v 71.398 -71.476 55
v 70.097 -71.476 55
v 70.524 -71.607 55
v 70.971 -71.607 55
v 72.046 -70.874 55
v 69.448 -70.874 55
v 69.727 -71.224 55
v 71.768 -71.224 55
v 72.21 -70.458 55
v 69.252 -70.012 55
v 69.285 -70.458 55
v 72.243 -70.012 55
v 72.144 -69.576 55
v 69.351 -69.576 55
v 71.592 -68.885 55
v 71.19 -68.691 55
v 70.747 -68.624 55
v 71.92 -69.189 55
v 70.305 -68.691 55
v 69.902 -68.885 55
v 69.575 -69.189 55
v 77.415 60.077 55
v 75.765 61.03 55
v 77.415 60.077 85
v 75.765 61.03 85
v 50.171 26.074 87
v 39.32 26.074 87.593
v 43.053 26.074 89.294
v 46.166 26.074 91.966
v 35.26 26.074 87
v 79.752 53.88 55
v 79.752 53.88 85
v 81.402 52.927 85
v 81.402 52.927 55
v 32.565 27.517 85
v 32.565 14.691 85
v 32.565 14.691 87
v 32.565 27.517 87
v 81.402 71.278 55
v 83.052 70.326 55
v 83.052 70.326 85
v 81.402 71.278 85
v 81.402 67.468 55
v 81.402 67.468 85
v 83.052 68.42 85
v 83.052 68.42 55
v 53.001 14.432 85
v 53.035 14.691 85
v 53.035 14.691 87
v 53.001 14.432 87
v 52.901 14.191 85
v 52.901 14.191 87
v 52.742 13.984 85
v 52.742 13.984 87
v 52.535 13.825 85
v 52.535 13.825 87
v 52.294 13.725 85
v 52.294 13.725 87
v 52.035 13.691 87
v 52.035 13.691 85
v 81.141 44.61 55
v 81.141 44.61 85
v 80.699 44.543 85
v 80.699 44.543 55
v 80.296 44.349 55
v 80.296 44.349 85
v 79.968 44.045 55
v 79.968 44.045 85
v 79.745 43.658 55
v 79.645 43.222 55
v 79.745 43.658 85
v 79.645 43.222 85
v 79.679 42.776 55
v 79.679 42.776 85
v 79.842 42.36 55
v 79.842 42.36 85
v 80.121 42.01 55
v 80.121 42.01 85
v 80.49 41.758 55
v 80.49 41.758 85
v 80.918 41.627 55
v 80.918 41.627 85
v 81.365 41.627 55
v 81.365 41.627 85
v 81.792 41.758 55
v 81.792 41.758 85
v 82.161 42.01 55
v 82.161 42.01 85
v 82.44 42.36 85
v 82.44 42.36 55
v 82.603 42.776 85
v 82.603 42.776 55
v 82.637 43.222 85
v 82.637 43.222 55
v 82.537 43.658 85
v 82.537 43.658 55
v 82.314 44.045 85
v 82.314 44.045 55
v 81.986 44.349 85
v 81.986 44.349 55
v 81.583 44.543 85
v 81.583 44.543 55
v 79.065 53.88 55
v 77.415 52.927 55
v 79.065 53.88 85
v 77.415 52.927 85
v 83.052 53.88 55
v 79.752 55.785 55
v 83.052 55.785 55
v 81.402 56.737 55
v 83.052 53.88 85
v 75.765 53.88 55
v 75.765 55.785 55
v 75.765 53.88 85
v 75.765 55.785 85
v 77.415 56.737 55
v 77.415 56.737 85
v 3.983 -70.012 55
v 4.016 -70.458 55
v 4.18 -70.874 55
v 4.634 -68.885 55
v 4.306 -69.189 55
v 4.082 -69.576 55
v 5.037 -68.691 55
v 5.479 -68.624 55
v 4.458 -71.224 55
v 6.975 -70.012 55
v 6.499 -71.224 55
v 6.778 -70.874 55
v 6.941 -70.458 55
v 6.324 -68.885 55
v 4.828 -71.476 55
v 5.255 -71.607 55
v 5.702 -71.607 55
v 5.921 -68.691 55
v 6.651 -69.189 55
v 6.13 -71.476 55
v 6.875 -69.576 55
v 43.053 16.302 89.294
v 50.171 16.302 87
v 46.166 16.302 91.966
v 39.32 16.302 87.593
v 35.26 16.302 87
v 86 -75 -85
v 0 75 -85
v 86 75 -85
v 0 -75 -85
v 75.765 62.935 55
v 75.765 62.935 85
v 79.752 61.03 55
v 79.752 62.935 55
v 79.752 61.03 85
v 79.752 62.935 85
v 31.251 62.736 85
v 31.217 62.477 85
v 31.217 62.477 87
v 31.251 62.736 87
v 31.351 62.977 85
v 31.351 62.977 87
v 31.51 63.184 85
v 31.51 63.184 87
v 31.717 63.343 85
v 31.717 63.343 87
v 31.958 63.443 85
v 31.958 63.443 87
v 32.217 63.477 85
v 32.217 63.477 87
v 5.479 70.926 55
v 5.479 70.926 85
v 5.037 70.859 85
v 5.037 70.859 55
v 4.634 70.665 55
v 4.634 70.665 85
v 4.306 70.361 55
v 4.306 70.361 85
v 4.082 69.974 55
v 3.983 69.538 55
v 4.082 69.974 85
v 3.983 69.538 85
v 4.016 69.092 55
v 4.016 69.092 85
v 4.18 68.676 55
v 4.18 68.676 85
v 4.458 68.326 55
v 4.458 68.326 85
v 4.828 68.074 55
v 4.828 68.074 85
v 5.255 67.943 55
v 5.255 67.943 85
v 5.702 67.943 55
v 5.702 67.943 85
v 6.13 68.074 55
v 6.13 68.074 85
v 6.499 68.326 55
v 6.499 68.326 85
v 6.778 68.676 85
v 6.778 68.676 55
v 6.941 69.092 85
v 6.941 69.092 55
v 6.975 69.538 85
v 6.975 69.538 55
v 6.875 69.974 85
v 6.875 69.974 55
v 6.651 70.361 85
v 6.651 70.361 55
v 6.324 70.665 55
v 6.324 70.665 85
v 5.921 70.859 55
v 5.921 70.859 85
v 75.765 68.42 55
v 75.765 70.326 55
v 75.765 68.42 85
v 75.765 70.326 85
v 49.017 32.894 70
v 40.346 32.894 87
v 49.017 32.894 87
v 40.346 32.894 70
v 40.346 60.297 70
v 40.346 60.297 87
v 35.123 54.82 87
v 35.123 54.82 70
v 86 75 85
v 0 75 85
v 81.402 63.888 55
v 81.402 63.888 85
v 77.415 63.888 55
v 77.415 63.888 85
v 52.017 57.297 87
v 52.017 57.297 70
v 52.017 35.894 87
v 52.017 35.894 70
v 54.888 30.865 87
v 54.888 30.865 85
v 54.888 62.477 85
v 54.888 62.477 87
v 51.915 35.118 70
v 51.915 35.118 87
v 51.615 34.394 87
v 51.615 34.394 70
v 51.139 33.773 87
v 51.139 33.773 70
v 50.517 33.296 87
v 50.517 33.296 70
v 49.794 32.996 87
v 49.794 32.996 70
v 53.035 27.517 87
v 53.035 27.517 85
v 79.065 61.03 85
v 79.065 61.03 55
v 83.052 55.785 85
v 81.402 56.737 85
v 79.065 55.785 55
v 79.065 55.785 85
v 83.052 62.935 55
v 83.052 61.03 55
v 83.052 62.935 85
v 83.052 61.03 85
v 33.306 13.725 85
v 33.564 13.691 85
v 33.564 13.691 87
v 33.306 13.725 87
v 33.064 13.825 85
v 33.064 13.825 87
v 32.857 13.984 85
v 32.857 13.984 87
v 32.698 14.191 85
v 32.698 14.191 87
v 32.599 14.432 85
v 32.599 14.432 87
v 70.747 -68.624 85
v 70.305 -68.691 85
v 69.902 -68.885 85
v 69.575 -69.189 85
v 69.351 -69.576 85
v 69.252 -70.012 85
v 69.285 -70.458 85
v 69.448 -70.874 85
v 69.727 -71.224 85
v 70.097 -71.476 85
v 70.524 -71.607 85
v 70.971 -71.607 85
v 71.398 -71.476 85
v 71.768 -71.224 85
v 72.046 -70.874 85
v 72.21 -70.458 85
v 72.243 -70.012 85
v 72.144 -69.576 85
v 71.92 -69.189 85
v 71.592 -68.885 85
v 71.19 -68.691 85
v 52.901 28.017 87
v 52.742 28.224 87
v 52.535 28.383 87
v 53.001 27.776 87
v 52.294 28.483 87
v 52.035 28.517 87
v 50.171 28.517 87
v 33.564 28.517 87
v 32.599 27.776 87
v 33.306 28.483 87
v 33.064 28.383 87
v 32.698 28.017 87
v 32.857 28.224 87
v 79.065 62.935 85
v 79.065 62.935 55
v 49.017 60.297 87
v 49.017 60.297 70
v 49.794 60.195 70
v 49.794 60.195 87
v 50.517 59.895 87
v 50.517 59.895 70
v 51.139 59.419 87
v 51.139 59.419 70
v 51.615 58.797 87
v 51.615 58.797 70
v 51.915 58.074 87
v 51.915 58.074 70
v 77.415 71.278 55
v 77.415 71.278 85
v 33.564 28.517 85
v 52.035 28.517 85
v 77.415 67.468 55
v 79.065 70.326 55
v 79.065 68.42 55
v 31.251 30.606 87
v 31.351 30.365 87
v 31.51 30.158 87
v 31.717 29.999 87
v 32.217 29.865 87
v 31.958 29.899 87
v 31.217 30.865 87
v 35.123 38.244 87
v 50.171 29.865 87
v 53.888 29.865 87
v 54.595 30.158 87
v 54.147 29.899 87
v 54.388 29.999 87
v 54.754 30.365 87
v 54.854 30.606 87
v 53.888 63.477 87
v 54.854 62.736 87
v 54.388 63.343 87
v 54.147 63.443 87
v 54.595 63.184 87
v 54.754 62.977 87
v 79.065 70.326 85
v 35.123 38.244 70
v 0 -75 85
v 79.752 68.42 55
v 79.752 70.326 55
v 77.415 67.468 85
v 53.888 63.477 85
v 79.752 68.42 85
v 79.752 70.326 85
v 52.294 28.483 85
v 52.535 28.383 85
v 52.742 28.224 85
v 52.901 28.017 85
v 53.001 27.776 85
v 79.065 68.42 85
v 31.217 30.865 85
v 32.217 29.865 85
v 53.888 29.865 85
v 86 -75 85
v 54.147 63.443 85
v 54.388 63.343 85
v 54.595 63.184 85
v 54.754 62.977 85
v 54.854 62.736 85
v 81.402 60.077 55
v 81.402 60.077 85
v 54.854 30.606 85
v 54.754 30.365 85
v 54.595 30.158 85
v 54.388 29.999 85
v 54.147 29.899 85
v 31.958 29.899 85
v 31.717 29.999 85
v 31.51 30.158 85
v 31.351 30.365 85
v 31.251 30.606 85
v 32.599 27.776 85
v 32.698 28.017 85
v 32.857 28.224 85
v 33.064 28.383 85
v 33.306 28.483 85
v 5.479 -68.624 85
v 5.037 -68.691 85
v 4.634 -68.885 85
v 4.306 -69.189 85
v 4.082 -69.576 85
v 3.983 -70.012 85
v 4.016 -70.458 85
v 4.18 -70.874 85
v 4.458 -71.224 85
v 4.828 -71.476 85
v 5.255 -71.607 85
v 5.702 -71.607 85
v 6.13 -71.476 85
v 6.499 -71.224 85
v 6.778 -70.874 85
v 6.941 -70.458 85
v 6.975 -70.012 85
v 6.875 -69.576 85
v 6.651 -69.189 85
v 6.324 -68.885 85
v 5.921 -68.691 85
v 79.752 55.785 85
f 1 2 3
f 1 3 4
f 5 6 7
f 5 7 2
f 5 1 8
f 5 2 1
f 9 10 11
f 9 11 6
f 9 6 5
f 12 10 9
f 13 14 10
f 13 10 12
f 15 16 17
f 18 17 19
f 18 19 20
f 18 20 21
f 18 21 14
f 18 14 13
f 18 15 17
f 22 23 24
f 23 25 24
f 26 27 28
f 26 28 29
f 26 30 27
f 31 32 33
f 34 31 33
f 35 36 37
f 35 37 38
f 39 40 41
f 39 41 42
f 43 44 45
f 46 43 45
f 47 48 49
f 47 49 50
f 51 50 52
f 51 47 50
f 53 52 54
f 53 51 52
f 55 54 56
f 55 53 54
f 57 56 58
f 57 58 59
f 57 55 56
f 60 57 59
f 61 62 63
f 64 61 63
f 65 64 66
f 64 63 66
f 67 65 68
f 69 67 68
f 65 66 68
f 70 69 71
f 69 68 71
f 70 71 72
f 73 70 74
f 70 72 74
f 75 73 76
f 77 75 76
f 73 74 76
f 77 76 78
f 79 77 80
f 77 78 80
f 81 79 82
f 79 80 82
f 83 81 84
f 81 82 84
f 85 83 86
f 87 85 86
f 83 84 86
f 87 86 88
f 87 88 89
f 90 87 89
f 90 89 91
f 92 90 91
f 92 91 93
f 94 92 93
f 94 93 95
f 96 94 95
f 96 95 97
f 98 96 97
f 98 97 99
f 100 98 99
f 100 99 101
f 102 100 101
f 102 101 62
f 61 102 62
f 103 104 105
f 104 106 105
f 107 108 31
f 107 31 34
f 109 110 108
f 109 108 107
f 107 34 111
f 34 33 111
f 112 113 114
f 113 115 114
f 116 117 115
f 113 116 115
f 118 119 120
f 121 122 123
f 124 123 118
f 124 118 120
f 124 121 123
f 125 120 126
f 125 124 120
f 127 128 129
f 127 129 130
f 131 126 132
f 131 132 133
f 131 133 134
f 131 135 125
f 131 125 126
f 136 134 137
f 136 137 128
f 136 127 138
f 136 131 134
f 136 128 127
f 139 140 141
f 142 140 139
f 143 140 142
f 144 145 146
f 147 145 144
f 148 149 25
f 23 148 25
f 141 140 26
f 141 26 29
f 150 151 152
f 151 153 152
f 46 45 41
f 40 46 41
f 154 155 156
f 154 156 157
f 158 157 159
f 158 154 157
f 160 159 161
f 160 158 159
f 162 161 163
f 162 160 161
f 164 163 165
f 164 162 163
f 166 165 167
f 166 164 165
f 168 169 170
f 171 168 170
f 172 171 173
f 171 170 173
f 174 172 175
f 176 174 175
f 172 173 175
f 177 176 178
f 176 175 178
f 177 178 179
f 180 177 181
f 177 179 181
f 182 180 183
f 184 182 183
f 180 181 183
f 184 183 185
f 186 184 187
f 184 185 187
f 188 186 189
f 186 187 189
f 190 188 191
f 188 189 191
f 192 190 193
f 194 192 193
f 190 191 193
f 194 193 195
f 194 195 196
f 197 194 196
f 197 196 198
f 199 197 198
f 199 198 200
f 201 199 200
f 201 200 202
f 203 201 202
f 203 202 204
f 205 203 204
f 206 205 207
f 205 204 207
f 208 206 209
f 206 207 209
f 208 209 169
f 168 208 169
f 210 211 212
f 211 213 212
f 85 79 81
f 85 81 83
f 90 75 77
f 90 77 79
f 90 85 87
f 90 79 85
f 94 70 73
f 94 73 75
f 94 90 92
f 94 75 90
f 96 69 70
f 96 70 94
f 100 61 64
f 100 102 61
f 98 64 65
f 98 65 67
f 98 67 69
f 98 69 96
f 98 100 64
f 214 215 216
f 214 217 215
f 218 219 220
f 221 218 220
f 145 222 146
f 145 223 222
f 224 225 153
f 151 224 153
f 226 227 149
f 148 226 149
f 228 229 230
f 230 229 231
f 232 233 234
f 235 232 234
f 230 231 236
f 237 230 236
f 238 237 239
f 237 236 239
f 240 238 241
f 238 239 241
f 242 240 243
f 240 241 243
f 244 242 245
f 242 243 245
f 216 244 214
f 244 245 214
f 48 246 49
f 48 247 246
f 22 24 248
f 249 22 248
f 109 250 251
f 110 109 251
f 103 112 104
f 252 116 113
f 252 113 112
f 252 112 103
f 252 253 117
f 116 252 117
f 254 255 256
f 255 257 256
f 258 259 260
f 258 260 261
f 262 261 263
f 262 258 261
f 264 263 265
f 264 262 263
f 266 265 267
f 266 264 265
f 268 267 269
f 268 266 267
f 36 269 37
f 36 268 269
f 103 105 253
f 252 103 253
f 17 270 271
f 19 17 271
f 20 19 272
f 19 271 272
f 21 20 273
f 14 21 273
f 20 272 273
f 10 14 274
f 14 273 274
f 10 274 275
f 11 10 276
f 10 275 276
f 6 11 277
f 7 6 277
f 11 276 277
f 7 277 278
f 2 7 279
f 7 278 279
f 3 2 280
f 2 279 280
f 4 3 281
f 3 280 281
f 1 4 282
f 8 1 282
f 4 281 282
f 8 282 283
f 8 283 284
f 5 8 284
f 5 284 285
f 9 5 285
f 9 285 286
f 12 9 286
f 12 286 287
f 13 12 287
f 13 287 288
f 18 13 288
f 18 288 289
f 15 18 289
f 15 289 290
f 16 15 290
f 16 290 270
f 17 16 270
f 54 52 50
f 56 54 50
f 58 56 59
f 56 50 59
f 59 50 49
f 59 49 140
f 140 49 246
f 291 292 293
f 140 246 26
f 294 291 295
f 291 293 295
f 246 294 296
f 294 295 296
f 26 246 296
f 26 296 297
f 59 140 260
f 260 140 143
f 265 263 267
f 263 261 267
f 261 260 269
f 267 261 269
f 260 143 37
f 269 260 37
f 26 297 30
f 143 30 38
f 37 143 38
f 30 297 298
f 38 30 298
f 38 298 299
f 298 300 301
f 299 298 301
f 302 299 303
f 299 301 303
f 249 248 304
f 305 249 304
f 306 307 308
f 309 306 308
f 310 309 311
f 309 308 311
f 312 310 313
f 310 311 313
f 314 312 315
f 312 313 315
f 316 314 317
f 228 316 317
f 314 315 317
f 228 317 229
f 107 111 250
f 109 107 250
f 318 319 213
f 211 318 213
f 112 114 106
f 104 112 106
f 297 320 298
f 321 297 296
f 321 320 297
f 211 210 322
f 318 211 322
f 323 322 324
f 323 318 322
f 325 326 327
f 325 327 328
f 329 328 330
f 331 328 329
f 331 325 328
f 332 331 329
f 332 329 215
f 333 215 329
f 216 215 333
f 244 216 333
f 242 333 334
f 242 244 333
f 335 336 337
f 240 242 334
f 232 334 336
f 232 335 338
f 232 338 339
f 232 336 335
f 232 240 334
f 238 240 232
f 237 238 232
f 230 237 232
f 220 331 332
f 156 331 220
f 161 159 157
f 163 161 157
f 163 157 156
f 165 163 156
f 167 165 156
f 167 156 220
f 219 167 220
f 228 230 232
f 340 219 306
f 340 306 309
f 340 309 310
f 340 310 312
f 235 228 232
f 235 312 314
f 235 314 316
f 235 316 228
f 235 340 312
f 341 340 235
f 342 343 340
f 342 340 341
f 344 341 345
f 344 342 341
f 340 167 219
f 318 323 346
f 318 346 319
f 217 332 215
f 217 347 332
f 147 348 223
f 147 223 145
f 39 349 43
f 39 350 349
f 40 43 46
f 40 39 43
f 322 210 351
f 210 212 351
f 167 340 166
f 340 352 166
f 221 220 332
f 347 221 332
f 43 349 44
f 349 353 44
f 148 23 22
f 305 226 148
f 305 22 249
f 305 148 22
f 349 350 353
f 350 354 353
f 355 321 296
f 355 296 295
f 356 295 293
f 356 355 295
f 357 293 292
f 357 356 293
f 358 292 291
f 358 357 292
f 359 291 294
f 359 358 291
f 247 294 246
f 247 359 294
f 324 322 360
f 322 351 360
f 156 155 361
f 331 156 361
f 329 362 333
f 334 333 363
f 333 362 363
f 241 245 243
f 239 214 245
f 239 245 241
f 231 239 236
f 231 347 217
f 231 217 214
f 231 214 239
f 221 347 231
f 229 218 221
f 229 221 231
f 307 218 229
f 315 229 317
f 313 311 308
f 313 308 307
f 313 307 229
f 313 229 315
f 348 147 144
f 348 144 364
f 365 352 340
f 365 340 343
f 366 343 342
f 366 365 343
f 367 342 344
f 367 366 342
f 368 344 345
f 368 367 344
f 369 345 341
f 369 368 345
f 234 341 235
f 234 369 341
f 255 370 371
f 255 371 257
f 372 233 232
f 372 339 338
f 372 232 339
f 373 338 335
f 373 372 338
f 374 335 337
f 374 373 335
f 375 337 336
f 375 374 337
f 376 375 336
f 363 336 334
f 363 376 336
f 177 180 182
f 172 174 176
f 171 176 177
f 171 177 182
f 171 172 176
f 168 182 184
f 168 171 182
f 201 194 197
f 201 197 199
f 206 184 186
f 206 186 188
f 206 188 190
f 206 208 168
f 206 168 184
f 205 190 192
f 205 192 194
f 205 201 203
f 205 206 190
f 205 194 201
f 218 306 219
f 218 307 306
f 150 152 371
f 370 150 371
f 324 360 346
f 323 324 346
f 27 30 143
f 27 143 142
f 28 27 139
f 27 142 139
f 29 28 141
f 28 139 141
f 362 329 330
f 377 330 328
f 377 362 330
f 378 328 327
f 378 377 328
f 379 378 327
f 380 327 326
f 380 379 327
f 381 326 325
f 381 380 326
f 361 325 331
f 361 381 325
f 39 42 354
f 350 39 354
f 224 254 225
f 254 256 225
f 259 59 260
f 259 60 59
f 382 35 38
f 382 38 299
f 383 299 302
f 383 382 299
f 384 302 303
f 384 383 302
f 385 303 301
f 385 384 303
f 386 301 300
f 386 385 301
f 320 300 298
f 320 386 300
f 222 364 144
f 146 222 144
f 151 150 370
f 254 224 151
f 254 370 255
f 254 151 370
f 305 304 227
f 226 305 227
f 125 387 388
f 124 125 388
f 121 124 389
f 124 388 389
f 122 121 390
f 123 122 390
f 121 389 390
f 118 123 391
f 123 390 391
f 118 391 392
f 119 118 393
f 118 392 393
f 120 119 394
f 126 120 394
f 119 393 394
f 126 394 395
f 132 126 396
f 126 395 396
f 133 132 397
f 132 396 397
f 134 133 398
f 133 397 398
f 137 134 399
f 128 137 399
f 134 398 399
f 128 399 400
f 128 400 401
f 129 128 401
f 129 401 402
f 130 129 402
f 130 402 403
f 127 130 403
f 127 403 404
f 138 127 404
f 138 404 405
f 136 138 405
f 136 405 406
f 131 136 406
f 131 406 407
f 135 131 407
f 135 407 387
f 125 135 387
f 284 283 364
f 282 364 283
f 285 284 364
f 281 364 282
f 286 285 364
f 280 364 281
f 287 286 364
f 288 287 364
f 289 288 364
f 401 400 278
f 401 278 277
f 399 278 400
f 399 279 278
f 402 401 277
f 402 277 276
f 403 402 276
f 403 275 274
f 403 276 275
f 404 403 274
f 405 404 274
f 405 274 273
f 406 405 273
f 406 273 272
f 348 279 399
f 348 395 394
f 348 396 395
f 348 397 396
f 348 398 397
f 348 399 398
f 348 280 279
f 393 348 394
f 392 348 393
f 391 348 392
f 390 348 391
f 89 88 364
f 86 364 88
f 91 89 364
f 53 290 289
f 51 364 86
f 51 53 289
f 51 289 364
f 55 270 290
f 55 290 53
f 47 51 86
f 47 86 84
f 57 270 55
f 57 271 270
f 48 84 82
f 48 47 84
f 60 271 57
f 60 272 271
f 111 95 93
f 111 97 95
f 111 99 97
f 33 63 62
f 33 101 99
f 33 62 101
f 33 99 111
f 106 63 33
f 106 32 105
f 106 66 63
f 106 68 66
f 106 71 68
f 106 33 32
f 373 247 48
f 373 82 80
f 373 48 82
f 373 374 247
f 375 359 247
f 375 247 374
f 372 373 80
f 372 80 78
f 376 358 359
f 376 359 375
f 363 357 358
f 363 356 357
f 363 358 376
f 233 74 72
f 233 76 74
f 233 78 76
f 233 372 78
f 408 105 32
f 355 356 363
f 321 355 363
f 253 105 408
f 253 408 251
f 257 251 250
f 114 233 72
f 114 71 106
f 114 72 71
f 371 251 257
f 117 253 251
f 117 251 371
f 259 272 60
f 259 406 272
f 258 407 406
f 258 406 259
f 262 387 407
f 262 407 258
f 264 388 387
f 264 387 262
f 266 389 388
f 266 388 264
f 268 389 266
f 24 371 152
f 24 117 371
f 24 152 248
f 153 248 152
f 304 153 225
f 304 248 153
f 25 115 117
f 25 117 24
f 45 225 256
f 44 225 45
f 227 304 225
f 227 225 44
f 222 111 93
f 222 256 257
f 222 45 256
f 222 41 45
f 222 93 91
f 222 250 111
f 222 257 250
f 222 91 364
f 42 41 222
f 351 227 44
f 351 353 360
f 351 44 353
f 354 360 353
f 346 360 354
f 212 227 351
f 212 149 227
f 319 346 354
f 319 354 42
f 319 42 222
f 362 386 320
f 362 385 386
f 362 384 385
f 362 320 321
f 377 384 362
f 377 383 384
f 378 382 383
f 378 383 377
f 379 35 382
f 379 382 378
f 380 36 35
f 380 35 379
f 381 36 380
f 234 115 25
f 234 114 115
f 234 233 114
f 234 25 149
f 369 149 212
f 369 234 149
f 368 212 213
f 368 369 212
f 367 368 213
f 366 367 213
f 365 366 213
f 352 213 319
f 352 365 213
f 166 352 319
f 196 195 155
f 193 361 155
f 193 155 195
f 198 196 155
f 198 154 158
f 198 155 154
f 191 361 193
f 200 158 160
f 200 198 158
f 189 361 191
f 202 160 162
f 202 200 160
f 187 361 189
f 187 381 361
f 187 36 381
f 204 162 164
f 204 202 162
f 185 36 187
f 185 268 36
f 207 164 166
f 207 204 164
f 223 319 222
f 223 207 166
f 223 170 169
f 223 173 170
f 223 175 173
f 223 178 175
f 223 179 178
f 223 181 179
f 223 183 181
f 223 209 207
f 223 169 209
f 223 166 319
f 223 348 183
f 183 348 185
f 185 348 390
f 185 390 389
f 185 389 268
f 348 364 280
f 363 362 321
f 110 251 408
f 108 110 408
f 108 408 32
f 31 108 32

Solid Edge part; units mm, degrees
sketch "Sketch1" plane through (0, 0, 0) normal (-1, 0, 0) x (0, -1, 0)
  line L0 (-75, -85) -> (75, -85)
  line L1 (75, -85) -> (75, 85)
  line L2 (75, 85) -> (-75, 85)
  line L3 (-75, 85) -> (-75, -85)
  dimension "D1" = 150
  dimension "D2" = 170
extrude "Protrusion1" add sketch "Sketch1" against normal blind 86
sketch "Sketch2" plane through (43, 0, 85) normal (0, 0, 1) x (0, 1, 0)
  circle A0 centre (-70.1242, -27.7474) radius 1.5
  circle A1 centre (69.4258, 37.5213) radius 1.5
  circle A2 centre (43.1098, -38.1411) radius 1.5
  line L0 (60.2973, 2.6541) -> (60.2973, -6.0172)
  arc A3 (57.2973, -9.0172) -> (60.2973, -6.0172) centre (57.2973, -6.0172) ccw
  line L1 (57.2973, -9.0172) -> (35.8941, -9.0172)
  arc A4 (32.8941, -6.0172) -> (35.8941, -9.0172) centre (35.8941, -6.0172) ccw
  line L2 (32.8941, -6.0172) -> (32.8941, 2.6541)
  line L3 (38.2443, 7.8768) -> (32.8941, 2.6541)
  line L4 (38.2443, 7.8768) -> (54.8198, 7.8768)
  line L5 (54.8198, 7.8768) -> (60.2973, 2.6541)
  circle A5 centre (-70.1242, 37.5213) radius 1.5
  line L6 (62.4771, -11.8883) -> (30.8651, -11.8883)
  arc A6 (30.8651, -11.8883) -> (29.8651, -10.8883) centre (30.8651, -10.8883) cw
  line L7 (29.8651, -10.8883) -> (29.8651, 10.7833)
  arc A7 (29.8651, 10.7833) -> (30.8651, 11.7833) centre (30.8651, 10.7833) cw
  line L8 (30.8651, 11.7833) -> (62.4771, 11.7833)
  arc A8 (63.4771, 10.7833) -> (62.4771, 11.7833) centre (62.4771, 10.7833) ccw
  line L9 (63.4771, 10.7833) -> (63.4771, -10.8883)
  arc A9 (63.4771, -10.8883) -> (62.4771, -11.8883) centre (62.4771, -10.8883) cw
  line L10 (27.5172, 10.4355) -> (14.6909, 10.4355)
  arc A10 (14.6909, 10.4355) -> (13.6909, 9.4355) centre (14.6909, 9.4355) ccw
  line L11 (13.6909, 9.4355) -> (13.6909, -9.035)
  arc A11 (13.6909, -9.035) -> (14.6909, -10.035) centre (14.6909, -9.035) ccw
  line L12 (14.6909, -10.035) -> (27.5172, -10.035)
  arc A12 (27.5172, -10.035) -> (28.5172, -9.035) centre (27.5172, -9.035) ccw
  line L13 (28.5172, -9.035) -> (28.5172, 9.4355)
  arc A13 (28.5172, 9.4355) -> (27.5172, 10.4355) centre (27.5172, 9.4355) ccw
  line L14 (26.0742, 7.7398) -> (16.3023, 7.7398)
  line L15 (16.3023, 7.7398) -> (16.3023, -7.1708)
  line L16 (16.3023, -7.1708) -> (26.0742, -7.1708)
  line L17 (26.0742, -7.1708) -> (26.0742, 7.7398)
  line L18 (70.3256, -36.7522) -> (68.4203, -36.7522)
  line L19 (68.4203, -36.7522) -> (67.4677, -38.4022)
  line L20 (67.4677, -38.4022) -> (68.4203, -40.0522)
  line L21 (68.4203, -40.0522) -> (70.3256, -40.0522)
  line L22 (70.3256, -40.0522) -> (71.2782, -38.4022)
  line L23 (71.2782, -38.4022) -> (70.3256, -36.7522)
  line L24 (62.9348, -36.7522) -> (61.0296, -36.7522)
  line L25 (61.0296, -36.7522) -> (60.077, -38.4022)
  line L26 (60.077, -38.4022) -> (61.0296, -40.0522)
  line L27 (61.0296, -40.0522) -> (62.9348, -40.0522)
  line L28 (62.9348, -40.0522) -> (63.8875, -38.4022)
  line L29 (63.8875, -38.4022) -> (62.9348, -36.7522)
  line L30 (55.7847, -36.7522) -> (53.8795, -36.7522)
  line L31 (53.8795, -36.7522) -> (52.9268, -38.4022)
  line L32 (52.9268, -38.4022) -> (53.8795, -40.0522)
  line L33 (53.8795, -40.0522) -> (55.7847, -40.0522)
  line L34 (55.7847, -40.0522) -> (56.7374, -38.4022)
  line L35 (56.7374, -38.4022) -> (55.7847, -36.7522)
  line L36 (55.7847, -32.7647) -> (53.8795, -32.7647)
  line L37 (53.8795, -32.7647) -> (52.9268, -34.4147)
  line L38 (52.9268, -34.4147) -> (53.8795, -36.0647)
  line L39 (53.8795, -36.0647) -> (55.7847, -36.0647)
  line L40 (55.7847, -36.0647) -> (56.7374, -34.4147)
  line L41 (56.7374, -34.4147) -> (55.7847, -32.7647)
  line L42 (62.9348, -32.7647) -> (61.0296, -32.7647)
  line L43 (61.0296, -32.7647) -> (60.077, -34.4147)
  line L44 (60.077, -34.4147) -> (61.0296, -36.0647)
  line L45 (61.0296, -36.0647) -> (62.9348, -36.0647)
  line L46 (62.9348, -36.0647) -> (63.8875, -34.4147)
  line L47 (63.8875, -34.4147) -> (62.9348, -32.7647)
  line L48 (70.3256, -32.7647) -> (68.4203, -32.7647)
  line L49 (68.4203, -32.7647) -> (67.4677, -34.4147)
  line L50 (67.4677, -34.4147) -> (68.4203, -36.0647)
  line L51 (68.4203, -36.0647) -> (70.3256, -36.0647)
  line L52 (70.3256, -36.0647) -> (71.2782, -34.4147)
  line L53 (71.2782, -34.4147) -> (70.3256, -32.7647)
  dimension "D1" = 3
  dimension "D2" = 3
  dimension "D3" = 3
  dimension "D4" = 3
  dimension "D5" = 21.4032
  dimension "D6" = 8.6713
  dimension "D7" = 7.4767
  dimension "D8" = 7.5684
  dimension "D9" = 3
  dimension "D10" = 3
  dimension "D11" = 31.612
  dimension "D12" = 21.6716
  dimension "D13" = 12.8264
  dimension "D14" = 18.4705
  dimension "D15" = 1
  dimension "D16" = 1
  dimension "D17" = 1
  dimension "D18" = 1
  dimension "D19" = 1
  dimension "D20" = 1
  dimension "D21" = 1
  dimension "D22" = 1
  dimension "D23" = 9.7719
  dimension "D24" = 14.9106
  dimension "D25" = 3.8105
  dimension "D26" = 3.8105
  dimension "D27" = 3.8105
  dimension "D28" = 3.8105
  dimension "D29" = 3.8105
  dimension "D30" = 3.8105
extrude "Cutout1" cut sketch "Sketch2" against normal blind 30
sketch "Sketch3" plane through (43.0525, 46.6711, 55) normal (0, 0, 1) x (0, 1, 0)
  line L0 (-16.806, 10.8358) -> (-16.806, -10.8358)
  arc A0 (-16.806, -10.8358) -> (-15.806, -11.8358) centre (-15.806, -10.8358) ccw
  line L1 (-15.806, -11.8358) -> (15.806, -11.8358)
  arc A1 (16.806, -10.8358) -> (15.806, -11.8358) centre (15.806, -10.8358) cw
  line L2 (16.806, -10.8358) -> (16.806, 10.8358)
  arc A2 (16.806, 10.8358) -> (15.806, 11.8358) centre (15.806, 10.8358) ccw
  line L3 (15.806, 11.8358) -> (-15.806, 11.8358)
  arc A3 (-15.806, 11.8358) -> (-16.806, 10.8358) centre (-15.806, 10.8358) ccw
  line L4 (-31.9802, 10.488) -> (-19.1539, 10.488)
  arc A4 (-18.1539, 9.488) -> (-19.1539, 10.488) centre (-19.1539, 9.488) ccw
  line L5 (-18.1539, 9.488) -> (-18.1539, -8.9825)
  arc A5 (-19.1539, -9.9825) -> (-18.1539, -8.9825) centre (-19.1539, -8.9825) ccw
  line L6 (-19.1539, -9.9825) -> (-31.9802, -9.9825)
  arc A6 (-31.9802, -9.9825) -> (-32.9802, -8.9825) centre (-31.9802, -8.9825) cw
  line L7 (-32.9802, -8.9825) -> (-32.9802, 9.488)
  arc A7 (-31.9802, 10.488) -> (-32.9802, 9.488) centre (-31.9802, 9.488) ccw
  dimension "D1" = 1
  dimension "D2" = 1
  dimension "D3" = 1
  dimension "D4" = 1
  dimension "D5" = 1
  dimension "D6" = 1
  dimension "D7" = 1
  dimension "D8" = 1
extrude "ExtrudedProtrusion_22" add sketch "Sketch3" along normal blind 32
sketch "Sketch4" plane through (43.0525, 46.6711, 70) normal (0, 0, 1) x (0, -1, 0)
  line L0 (-13.6262, 5.9647) -> (-13.6262, -2.7066)
  line L1 (-13.6262, -2.7066) -> (-8.1487, -7.9293)
  line L2 (-8.1487, -7.9293) -> (8.4268, -7.9293)
  line L3 (8.4268, -7.9293) -> (13.777, -2.7066)
  line L4 (13.777, -2.7066) -> (13.777, 5.9647)
  arc A0 (10.777, 8.9647) -> (13.777, 5.9647) centre (10.777, 5.9647) cw
  line L5 (-10.6262, 8.9647) -> (10.777, 8.9647)
  arc A1 (-10.6262, 8.9647) -> (-13.6262, 5.9647) centre (-10.6262, 5.9647) ccw
  line L6 (20.5968, 7.1183) -> (30.3688, 7.1183)
  line L7 (30.3688, 7.1183) -> (30.3688, -7.7923)
  line L8 (30.3688, -7.7923) -> (20.5968, -7.7923)
  line L9 (20.5968, -7.7923) -> (20.5968, 7.1183)
  dimension "D1" = 3
  dimension "D2" = 3
  dimension "D3" = 9.7719
  dimension "D4" = 14.9106
extrude "ExtrudedCutout_39" cut sketch "Sketch4" along normal blind 45
sketch "Sketch5" plane through (42.7155, 21.1883, 70) normal (0, 0, 1) x (0, 1, 0)
  line L0 (-4.886, 7.4553) -> (4.886, 7.4553)
  line L1 (4.886, 7.4553) -> (4.886, -7.4553)
  line L2 (4.886, -7.4553) -> (-4.886, -7.4553)
  line L3 (-4.886, -7.4553) -> (-4.886, 7.4553)
  dimension "D1" = 9.7719
  dimension "D2" = 14.9106
extrude "Protrusion2" add sketch "Sketch5" along normal blind 30
sketch "Sketch6" plane through (42.7155, 16.3023, 93.5) normal (0, -1, 0) x (0, 0, 1)
  line L0 (-6.5, -7.4553) -> (-1.5337, -3.4507)
  arc A0 (-6.5, 7.4553) -> (-1.5337, -3.4507) centre (8.0884, 7.5147) ccw
  line L1 (-6.5, 7.4553) -> (6.5, 7.4553)
  line L2 (6.5, 7.4553) -> (6.5, -7.4553)
  line L3 (6.5, -7.4553) -> (-6.5, -7.4553)
  dimension "D1" = 6.3797
  dimension "D2" = 14.5886
extrude "ExtrudedCutout_40" cut sketch "Sketch6" against normal blind 15
